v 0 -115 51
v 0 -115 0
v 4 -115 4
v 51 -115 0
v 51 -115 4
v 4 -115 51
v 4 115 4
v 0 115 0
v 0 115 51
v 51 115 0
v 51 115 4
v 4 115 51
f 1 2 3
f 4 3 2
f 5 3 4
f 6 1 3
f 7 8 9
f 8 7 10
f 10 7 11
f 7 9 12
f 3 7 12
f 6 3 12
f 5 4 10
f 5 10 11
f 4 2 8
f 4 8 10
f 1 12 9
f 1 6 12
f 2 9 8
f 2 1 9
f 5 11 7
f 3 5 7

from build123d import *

# Parameters (mm, degrees)
PAD_DEPTH = 115


with BuildPart() as part:
    # Sketch → Pad (new body, symmetric)
    with BuildSketch(Plane.XZ):
        Polygon((0, 51), (0, 0), (51, 0), (51, 4), (4, 4), (4, 51), align=None)
    extrude(amount=PAD_DEPTH, both=True)


solid = part.part
